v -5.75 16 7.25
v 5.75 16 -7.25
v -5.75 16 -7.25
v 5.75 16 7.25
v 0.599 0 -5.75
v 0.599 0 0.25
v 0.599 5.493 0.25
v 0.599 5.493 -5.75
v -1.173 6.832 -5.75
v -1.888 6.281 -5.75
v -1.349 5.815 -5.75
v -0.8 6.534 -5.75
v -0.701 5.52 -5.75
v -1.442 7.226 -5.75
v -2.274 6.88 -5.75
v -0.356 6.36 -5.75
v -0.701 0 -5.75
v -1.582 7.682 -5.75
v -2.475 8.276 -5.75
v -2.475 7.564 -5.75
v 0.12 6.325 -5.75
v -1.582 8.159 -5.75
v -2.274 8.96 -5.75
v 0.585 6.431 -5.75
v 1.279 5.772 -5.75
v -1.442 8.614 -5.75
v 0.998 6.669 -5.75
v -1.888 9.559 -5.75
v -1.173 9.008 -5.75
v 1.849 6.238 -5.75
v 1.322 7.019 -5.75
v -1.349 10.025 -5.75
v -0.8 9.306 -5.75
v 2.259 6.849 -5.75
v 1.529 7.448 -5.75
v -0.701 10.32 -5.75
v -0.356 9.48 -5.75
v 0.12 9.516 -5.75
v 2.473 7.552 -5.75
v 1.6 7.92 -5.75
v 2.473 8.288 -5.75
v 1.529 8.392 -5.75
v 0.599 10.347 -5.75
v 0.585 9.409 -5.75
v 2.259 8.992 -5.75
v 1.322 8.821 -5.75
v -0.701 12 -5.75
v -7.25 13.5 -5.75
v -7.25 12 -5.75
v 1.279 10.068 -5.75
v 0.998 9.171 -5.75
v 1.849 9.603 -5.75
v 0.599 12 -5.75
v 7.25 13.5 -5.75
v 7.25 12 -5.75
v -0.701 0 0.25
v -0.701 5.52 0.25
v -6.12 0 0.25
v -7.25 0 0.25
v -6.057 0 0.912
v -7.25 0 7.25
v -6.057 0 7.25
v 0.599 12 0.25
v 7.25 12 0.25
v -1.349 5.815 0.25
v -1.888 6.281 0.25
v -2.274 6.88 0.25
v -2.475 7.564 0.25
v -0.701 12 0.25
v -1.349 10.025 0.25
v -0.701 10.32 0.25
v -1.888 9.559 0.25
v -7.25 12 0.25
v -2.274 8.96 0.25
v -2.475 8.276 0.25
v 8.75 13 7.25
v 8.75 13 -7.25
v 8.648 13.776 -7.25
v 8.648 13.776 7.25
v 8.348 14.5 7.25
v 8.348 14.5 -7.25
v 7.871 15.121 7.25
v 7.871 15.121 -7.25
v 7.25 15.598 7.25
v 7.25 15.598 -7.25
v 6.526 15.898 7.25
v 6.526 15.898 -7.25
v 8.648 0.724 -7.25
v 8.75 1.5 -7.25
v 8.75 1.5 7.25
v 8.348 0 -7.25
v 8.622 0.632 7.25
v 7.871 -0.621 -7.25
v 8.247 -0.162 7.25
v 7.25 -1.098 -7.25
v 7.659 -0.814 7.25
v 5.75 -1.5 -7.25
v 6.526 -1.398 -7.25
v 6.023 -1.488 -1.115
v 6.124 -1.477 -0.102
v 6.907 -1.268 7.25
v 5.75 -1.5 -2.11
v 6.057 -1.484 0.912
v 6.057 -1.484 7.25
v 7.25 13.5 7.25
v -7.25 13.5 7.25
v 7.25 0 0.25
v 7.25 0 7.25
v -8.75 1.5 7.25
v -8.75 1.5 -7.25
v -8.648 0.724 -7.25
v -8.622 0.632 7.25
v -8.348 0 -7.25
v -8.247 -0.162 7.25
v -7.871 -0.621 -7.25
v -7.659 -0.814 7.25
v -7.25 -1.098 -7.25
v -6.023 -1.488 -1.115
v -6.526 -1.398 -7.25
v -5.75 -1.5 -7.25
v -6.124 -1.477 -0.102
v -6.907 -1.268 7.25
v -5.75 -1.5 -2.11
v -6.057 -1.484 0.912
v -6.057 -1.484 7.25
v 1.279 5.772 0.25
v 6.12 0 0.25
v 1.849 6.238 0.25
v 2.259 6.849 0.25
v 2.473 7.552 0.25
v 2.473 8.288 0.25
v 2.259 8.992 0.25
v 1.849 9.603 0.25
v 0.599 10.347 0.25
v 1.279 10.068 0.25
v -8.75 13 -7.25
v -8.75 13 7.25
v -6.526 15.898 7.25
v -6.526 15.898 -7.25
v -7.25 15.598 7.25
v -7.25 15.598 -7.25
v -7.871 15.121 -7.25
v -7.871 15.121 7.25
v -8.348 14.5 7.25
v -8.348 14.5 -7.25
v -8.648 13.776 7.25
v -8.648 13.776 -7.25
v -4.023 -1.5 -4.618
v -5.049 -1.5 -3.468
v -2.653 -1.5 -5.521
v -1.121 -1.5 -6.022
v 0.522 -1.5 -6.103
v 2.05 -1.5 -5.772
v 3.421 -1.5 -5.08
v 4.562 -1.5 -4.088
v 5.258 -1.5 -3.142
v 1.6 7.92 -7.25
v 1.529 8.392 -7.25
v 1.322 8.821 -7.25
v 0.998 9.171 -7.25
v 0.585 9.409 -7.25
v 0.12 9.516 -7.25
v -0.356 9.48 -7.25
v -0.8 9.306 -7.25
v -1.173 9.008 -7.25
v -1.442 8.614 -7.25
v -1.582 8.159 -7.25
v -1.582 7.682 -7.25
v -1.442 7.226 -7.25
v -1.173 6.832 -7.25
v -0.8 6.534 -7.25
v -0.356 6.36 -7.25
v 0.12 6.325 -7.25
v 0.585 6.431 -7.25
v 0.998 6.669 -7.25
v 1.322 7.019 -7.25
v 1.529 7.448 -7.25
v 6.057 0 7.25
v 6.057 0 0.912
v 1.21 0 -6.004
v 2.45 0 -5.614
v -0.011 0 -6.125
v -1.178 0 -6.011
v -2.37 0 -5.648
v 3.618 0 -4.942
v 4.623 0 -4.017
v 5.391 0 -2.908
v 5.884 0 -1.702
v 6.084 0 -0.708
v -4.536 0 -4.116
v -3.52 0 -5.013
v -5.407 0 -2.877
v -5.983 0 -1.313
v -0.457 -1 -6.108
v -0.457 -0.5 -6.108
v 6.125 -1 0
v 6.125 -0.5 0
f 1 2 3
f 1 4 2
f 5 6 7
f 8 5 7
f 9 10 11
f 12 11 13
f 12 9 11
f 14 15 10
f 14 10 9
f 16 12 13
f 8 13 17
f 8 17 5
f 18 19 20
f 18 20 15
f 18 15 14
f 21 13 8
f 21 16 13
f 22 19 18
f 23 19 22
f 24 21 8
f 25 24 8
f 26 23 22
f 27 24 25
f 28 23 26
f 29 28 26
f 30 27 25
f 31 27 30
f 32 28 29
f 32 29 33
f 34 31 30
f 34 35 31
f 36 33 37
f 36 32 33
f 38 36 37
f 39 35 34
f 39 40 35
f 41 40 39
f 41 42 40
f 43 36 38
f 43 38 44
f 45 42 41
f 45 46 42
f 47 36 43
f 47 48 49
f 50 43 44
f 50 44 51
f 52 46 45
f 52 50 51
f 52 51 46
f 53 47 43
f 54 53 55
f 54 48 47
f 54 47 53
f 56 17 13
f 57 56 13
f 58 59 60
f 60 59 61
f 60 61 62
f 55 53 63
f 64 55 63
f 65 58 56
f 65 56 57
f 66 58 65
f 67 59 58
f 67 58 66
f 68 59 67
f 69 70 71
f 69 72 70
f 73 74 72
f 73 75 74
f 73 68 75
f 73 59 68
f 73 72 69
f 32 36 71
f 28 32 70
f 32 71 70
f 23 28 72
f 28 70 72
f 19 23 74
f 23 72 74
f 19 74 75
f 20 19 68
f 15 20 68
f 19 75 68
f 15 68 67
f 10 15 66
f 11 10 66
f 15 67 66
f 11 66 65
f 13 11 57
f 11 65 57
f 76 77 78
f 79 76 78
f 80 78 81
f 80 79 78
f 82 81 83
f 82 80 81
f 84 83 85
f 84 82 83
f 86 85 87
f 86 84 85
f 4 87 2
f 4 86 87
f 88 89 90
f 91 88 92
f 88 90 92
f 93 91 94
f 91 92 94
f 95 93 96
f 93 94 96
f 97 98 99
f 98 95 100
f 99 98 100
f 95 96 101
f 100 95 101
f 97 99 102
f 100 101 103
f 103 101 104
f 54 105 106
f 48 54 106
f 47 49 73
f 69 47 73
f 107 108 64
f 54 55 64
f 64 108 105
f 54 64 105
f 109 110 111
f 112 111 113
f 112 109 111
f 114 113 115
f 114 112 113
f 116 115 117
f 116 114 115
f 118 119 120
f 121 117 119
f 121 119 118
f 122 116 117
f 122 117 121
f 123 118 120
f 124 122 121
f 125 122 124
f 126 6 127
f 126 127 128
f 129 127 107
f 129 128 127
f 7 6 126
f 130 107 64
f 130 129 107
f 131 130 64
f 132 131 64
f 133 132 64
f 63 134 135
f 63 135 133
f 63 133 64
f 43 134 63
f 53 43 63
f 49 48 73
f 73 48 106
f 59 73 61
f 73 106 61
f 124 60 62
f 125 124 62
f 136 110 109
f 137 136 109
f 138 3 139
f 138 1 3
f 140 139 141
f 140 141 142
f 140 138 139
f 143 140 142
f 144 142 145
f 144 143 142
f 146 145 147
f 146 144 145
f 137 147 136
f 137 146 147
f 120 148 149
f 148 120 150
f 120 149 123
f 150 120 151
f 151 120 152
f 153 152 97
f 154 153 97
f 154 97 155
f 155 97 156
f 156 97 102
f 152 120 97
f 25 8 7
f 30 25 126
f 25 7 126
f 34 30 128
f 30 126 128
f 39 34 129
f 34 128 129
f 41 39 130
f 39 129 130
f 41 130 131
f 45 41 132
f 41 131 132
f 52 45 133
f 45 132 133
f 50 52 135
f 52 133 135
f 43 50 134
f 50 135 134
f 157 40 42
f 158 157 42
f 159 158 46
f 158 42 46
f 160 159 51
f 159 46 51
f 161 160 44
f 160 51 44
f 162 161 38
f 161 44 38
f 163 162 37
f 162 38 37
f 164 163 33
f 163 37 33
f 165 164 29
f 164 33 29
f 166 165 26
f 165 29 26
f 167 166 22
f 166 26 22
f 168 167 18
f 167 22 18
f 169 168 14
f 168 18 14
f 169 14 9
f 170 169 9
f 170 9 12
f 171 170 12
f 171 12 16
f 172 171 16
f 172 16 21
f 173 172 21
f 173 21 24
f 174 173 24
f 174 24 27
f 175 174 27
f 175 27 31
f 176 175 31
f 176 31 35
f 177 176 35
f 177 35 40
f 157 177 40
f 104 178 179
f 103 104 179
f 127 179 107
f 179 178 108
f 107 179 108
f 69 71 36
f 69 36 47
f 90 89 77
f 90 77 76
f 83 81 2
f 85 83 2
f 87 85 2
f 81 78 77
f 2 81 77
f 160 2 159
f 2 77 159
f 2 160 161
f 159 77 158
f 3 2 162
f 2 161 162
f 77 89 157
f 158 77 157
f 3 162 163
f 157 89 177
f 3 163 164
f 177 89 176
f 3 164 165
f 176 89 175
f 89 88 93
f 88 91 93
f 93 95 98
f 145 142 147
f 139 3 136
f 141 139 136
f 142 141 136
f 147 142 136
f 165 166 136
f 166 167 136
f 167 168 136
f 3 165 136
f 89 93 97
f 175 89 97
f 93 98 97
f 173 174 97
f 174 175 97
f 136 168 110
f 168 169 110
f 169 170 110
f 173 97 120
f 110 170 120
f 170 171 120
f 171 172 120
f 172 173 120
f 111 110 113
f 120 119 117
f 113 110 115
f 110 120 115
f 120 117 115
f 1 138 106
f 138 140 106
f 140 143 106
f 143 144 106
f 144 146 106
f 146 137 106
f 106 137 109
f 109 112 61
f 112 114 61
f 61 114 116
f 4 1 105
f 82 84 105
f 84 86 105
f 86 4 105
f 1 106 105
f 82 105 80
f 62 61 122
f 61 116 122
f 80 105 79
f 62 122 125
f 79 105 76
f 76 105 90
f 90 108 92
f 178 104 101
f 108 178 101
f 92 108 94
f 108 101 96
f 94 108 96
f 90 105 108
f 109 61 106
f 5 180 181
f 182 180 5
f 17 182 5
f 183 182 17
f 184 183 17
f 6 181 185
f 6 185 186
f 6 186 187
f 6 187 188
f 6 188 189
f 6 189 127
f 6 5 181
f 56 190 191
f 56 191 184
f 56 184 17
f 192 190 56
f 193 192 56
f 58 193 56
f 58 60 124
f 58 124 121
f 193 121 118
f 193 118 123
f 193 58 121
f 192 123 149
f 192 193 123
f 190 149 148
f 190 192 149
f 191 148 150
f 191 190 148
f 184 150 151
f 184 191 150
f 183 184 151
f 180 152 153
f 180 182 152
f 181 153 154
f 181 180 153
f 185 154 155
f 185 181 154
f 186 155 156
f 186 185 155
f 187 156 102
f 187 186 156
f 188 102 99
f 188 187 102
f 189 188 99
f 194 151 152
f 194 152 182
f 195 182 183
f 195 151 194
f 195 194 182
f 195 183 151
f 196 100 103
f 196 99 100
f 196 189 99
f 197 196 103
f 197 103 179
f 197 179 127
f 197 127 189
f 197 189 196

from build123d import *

# Parameters (mm, degrees)
F1_DEPTH  = 1.5
F2_W      = 13.5
F2_H      = 14.5
F2_W_2    = 1.5
F3_DEPTH  = 1.5
F4_W      = 1.5
F4_H      = 14.5
F4_W_2    = 13.5
F5_DEPTH  = 1.5
F6_W      = 16
F6_H      = 14.5
F6_W_2    = 1.5
F7_DEPTH  = 2.5
F8_W      = 14.5
F8_H      = 13.5
F9_DEPTH  = 1.5
F10_W     = 12
F10_H     = 6
F11_DEPTH = 14.5
F12_W     = 1.3
F12_H     = 12
F13_DEPTH = 6
F14_R     = 2.5
F14_R_2   = 1.6
F15_DEPTH = 13
F16_DEPTH = 14.5010001
F17_R     = 3


with BuildPart() as f1:
    # F0 (on Front) → F1 (new body)
    with BuildSketch(Plane.XZ):
        with BuildLine():
            Line((-6.0567391277, 7.25), (-7.25, 7.25))
            Line((-7.25, 7.25), (-7.25, -7.25))
            Line((-7.25, -7.25), (7.25, -7.25))
            Line((7.25, -7.25), (7.25, 7.25))
            Line((7.25, 7.25), (6.0567391277, 7.25))
            Line((6.0567391277, 7.25), (6.0567391277, 0.9118860342))
            add(Edge.make_bspline(
                [(6.125, 0), (6.125, 0.4584979124), (6.0567391277, 0.9118860342)],
                knots=[0, 0, 0, 0.1494348984, 0.1494348984, 0.1494348984], degree=2, weights=[1, 0.9972099498, 1]))
            add(Edge.make_bspline(
                [(-6.0567391277, 0.9118860342), (-7.0394373604, -5.6151871016), (-0.4572186802, -6.1079109423), (6.125, -6.6006347829), (6.125, 0)],
                knots=[2.9921577552, 2.9921577552, 2.9921577552, 4.6376715312, 4.6376715312, 6.2831853072, 6.2831853072, 6.2831853072], degree=2, weights=[1, 0.6802029301, 1, 0.6802029301, 1]))
            Line((-6.0567391277, 0.9118860342), (-6.0567391277, 7.25))
        make_face()
    extrude(amount=F1_DEPTH)

    # F2 (on face) → F3 (join)
    with BuildSketch(Plane.YZ.offset(7.25)):
        with Locations((6.75, 0)):
            Rectangle(F2_W, F2_H)
        with Locations((-0.75, 0)):
            Rectangle(F2_W_2, F2_H)
    extrude(amount=F3_DEPTH)

    # F4 (on face) → F5 (join)
    with BuildSketch(Plane(origin=(-7.25, 0, 0), x_dir=(0, -1, 0), z_dir=(-1, 0, 0))):
        with Locations((0.75, 0)):
            Rectangle(F4_W, F4_H)
        with Locations((-6.75, 0)):
            Rectangle(F4_W_2, F4_H)
    extrude(amount=F5_DEPTH)

    # F6 (on face) → F7 (join)
    with BuildSketch(Plane(origin=(0, 13.5, 0), x_dir=(-1, 0, 0), z_dir=(0, 1, 0))):
        with Locations((-0.75, 0)):
            Rectangle(F6_W, F6_H)
        with Locations((8, 0)):
            Rectangle(F6_W_2, F6_H)
    extrude(amount=F7_DEPTH)

    # F8 (on face) → F9 (join)
    with BuildSketch(Plane(origin=(0, 0, -7.25), x_dir=(1, 0, 0), z_dir=(0, 0, -1))):
        with Locations((0, -6.75)):
            Rectangle(F8_W, F8_H)
    extrude(amount=-F9_DEPTH)

    # F10 (on face) → F11 (join, through all)
    with BuildSketch(Plane.YZ.offset(-7.25)):
        with Locations((6, -2.75)):
            Rectangle(F10_W, F10_H)
    extrude(amount=F11_DEPTH)

    # F12 (on face) → F13 (cut, through all)
    with BuildSketch(Plane.XY.offset(0.25)):
        with Locations((-0.051082634, 6)):
            Rectangle(F12_W, F12_H)
    extrude(amount=-F13_DEPTH, mode=Mode.SUBTRACT)

    # F14 (on face) → F15 (cut, through all)
    with BuildSketch(Plane.XY.offset(7.25)):
        with Locations((0, 7.9200456385)):
            Circle(F14_R)
        with Locations((0, 7.9200456385)):
            Circle(F14_R_2, mode=Mode.SUBTRACT)
    extrude(amount=-F15_DEPTH, mode=Mode.SUBTRACT)

    # F14 (on face) → F16 (cut, through all)
    with BuildSketch(Plane.XY.offset(7.25)):
        with Locations((0, 7.9200456385)):
            Circle(F14_R_2)
    extrude(amount=-F16_DEPTH, mode=Mode.SUBTRACT)

    # F17
    f17_edges = [f1.edges().sort_by_distance(p)[0] for p in [
        (8.75, -1.5, 0),
        (-8.75, -1.5, 0),
        (-8.75, 16, 0),
        (8.75, 16, 0),
    ]]
    fillet(f17_edges, radius=F17_R)


solid = f1.part
